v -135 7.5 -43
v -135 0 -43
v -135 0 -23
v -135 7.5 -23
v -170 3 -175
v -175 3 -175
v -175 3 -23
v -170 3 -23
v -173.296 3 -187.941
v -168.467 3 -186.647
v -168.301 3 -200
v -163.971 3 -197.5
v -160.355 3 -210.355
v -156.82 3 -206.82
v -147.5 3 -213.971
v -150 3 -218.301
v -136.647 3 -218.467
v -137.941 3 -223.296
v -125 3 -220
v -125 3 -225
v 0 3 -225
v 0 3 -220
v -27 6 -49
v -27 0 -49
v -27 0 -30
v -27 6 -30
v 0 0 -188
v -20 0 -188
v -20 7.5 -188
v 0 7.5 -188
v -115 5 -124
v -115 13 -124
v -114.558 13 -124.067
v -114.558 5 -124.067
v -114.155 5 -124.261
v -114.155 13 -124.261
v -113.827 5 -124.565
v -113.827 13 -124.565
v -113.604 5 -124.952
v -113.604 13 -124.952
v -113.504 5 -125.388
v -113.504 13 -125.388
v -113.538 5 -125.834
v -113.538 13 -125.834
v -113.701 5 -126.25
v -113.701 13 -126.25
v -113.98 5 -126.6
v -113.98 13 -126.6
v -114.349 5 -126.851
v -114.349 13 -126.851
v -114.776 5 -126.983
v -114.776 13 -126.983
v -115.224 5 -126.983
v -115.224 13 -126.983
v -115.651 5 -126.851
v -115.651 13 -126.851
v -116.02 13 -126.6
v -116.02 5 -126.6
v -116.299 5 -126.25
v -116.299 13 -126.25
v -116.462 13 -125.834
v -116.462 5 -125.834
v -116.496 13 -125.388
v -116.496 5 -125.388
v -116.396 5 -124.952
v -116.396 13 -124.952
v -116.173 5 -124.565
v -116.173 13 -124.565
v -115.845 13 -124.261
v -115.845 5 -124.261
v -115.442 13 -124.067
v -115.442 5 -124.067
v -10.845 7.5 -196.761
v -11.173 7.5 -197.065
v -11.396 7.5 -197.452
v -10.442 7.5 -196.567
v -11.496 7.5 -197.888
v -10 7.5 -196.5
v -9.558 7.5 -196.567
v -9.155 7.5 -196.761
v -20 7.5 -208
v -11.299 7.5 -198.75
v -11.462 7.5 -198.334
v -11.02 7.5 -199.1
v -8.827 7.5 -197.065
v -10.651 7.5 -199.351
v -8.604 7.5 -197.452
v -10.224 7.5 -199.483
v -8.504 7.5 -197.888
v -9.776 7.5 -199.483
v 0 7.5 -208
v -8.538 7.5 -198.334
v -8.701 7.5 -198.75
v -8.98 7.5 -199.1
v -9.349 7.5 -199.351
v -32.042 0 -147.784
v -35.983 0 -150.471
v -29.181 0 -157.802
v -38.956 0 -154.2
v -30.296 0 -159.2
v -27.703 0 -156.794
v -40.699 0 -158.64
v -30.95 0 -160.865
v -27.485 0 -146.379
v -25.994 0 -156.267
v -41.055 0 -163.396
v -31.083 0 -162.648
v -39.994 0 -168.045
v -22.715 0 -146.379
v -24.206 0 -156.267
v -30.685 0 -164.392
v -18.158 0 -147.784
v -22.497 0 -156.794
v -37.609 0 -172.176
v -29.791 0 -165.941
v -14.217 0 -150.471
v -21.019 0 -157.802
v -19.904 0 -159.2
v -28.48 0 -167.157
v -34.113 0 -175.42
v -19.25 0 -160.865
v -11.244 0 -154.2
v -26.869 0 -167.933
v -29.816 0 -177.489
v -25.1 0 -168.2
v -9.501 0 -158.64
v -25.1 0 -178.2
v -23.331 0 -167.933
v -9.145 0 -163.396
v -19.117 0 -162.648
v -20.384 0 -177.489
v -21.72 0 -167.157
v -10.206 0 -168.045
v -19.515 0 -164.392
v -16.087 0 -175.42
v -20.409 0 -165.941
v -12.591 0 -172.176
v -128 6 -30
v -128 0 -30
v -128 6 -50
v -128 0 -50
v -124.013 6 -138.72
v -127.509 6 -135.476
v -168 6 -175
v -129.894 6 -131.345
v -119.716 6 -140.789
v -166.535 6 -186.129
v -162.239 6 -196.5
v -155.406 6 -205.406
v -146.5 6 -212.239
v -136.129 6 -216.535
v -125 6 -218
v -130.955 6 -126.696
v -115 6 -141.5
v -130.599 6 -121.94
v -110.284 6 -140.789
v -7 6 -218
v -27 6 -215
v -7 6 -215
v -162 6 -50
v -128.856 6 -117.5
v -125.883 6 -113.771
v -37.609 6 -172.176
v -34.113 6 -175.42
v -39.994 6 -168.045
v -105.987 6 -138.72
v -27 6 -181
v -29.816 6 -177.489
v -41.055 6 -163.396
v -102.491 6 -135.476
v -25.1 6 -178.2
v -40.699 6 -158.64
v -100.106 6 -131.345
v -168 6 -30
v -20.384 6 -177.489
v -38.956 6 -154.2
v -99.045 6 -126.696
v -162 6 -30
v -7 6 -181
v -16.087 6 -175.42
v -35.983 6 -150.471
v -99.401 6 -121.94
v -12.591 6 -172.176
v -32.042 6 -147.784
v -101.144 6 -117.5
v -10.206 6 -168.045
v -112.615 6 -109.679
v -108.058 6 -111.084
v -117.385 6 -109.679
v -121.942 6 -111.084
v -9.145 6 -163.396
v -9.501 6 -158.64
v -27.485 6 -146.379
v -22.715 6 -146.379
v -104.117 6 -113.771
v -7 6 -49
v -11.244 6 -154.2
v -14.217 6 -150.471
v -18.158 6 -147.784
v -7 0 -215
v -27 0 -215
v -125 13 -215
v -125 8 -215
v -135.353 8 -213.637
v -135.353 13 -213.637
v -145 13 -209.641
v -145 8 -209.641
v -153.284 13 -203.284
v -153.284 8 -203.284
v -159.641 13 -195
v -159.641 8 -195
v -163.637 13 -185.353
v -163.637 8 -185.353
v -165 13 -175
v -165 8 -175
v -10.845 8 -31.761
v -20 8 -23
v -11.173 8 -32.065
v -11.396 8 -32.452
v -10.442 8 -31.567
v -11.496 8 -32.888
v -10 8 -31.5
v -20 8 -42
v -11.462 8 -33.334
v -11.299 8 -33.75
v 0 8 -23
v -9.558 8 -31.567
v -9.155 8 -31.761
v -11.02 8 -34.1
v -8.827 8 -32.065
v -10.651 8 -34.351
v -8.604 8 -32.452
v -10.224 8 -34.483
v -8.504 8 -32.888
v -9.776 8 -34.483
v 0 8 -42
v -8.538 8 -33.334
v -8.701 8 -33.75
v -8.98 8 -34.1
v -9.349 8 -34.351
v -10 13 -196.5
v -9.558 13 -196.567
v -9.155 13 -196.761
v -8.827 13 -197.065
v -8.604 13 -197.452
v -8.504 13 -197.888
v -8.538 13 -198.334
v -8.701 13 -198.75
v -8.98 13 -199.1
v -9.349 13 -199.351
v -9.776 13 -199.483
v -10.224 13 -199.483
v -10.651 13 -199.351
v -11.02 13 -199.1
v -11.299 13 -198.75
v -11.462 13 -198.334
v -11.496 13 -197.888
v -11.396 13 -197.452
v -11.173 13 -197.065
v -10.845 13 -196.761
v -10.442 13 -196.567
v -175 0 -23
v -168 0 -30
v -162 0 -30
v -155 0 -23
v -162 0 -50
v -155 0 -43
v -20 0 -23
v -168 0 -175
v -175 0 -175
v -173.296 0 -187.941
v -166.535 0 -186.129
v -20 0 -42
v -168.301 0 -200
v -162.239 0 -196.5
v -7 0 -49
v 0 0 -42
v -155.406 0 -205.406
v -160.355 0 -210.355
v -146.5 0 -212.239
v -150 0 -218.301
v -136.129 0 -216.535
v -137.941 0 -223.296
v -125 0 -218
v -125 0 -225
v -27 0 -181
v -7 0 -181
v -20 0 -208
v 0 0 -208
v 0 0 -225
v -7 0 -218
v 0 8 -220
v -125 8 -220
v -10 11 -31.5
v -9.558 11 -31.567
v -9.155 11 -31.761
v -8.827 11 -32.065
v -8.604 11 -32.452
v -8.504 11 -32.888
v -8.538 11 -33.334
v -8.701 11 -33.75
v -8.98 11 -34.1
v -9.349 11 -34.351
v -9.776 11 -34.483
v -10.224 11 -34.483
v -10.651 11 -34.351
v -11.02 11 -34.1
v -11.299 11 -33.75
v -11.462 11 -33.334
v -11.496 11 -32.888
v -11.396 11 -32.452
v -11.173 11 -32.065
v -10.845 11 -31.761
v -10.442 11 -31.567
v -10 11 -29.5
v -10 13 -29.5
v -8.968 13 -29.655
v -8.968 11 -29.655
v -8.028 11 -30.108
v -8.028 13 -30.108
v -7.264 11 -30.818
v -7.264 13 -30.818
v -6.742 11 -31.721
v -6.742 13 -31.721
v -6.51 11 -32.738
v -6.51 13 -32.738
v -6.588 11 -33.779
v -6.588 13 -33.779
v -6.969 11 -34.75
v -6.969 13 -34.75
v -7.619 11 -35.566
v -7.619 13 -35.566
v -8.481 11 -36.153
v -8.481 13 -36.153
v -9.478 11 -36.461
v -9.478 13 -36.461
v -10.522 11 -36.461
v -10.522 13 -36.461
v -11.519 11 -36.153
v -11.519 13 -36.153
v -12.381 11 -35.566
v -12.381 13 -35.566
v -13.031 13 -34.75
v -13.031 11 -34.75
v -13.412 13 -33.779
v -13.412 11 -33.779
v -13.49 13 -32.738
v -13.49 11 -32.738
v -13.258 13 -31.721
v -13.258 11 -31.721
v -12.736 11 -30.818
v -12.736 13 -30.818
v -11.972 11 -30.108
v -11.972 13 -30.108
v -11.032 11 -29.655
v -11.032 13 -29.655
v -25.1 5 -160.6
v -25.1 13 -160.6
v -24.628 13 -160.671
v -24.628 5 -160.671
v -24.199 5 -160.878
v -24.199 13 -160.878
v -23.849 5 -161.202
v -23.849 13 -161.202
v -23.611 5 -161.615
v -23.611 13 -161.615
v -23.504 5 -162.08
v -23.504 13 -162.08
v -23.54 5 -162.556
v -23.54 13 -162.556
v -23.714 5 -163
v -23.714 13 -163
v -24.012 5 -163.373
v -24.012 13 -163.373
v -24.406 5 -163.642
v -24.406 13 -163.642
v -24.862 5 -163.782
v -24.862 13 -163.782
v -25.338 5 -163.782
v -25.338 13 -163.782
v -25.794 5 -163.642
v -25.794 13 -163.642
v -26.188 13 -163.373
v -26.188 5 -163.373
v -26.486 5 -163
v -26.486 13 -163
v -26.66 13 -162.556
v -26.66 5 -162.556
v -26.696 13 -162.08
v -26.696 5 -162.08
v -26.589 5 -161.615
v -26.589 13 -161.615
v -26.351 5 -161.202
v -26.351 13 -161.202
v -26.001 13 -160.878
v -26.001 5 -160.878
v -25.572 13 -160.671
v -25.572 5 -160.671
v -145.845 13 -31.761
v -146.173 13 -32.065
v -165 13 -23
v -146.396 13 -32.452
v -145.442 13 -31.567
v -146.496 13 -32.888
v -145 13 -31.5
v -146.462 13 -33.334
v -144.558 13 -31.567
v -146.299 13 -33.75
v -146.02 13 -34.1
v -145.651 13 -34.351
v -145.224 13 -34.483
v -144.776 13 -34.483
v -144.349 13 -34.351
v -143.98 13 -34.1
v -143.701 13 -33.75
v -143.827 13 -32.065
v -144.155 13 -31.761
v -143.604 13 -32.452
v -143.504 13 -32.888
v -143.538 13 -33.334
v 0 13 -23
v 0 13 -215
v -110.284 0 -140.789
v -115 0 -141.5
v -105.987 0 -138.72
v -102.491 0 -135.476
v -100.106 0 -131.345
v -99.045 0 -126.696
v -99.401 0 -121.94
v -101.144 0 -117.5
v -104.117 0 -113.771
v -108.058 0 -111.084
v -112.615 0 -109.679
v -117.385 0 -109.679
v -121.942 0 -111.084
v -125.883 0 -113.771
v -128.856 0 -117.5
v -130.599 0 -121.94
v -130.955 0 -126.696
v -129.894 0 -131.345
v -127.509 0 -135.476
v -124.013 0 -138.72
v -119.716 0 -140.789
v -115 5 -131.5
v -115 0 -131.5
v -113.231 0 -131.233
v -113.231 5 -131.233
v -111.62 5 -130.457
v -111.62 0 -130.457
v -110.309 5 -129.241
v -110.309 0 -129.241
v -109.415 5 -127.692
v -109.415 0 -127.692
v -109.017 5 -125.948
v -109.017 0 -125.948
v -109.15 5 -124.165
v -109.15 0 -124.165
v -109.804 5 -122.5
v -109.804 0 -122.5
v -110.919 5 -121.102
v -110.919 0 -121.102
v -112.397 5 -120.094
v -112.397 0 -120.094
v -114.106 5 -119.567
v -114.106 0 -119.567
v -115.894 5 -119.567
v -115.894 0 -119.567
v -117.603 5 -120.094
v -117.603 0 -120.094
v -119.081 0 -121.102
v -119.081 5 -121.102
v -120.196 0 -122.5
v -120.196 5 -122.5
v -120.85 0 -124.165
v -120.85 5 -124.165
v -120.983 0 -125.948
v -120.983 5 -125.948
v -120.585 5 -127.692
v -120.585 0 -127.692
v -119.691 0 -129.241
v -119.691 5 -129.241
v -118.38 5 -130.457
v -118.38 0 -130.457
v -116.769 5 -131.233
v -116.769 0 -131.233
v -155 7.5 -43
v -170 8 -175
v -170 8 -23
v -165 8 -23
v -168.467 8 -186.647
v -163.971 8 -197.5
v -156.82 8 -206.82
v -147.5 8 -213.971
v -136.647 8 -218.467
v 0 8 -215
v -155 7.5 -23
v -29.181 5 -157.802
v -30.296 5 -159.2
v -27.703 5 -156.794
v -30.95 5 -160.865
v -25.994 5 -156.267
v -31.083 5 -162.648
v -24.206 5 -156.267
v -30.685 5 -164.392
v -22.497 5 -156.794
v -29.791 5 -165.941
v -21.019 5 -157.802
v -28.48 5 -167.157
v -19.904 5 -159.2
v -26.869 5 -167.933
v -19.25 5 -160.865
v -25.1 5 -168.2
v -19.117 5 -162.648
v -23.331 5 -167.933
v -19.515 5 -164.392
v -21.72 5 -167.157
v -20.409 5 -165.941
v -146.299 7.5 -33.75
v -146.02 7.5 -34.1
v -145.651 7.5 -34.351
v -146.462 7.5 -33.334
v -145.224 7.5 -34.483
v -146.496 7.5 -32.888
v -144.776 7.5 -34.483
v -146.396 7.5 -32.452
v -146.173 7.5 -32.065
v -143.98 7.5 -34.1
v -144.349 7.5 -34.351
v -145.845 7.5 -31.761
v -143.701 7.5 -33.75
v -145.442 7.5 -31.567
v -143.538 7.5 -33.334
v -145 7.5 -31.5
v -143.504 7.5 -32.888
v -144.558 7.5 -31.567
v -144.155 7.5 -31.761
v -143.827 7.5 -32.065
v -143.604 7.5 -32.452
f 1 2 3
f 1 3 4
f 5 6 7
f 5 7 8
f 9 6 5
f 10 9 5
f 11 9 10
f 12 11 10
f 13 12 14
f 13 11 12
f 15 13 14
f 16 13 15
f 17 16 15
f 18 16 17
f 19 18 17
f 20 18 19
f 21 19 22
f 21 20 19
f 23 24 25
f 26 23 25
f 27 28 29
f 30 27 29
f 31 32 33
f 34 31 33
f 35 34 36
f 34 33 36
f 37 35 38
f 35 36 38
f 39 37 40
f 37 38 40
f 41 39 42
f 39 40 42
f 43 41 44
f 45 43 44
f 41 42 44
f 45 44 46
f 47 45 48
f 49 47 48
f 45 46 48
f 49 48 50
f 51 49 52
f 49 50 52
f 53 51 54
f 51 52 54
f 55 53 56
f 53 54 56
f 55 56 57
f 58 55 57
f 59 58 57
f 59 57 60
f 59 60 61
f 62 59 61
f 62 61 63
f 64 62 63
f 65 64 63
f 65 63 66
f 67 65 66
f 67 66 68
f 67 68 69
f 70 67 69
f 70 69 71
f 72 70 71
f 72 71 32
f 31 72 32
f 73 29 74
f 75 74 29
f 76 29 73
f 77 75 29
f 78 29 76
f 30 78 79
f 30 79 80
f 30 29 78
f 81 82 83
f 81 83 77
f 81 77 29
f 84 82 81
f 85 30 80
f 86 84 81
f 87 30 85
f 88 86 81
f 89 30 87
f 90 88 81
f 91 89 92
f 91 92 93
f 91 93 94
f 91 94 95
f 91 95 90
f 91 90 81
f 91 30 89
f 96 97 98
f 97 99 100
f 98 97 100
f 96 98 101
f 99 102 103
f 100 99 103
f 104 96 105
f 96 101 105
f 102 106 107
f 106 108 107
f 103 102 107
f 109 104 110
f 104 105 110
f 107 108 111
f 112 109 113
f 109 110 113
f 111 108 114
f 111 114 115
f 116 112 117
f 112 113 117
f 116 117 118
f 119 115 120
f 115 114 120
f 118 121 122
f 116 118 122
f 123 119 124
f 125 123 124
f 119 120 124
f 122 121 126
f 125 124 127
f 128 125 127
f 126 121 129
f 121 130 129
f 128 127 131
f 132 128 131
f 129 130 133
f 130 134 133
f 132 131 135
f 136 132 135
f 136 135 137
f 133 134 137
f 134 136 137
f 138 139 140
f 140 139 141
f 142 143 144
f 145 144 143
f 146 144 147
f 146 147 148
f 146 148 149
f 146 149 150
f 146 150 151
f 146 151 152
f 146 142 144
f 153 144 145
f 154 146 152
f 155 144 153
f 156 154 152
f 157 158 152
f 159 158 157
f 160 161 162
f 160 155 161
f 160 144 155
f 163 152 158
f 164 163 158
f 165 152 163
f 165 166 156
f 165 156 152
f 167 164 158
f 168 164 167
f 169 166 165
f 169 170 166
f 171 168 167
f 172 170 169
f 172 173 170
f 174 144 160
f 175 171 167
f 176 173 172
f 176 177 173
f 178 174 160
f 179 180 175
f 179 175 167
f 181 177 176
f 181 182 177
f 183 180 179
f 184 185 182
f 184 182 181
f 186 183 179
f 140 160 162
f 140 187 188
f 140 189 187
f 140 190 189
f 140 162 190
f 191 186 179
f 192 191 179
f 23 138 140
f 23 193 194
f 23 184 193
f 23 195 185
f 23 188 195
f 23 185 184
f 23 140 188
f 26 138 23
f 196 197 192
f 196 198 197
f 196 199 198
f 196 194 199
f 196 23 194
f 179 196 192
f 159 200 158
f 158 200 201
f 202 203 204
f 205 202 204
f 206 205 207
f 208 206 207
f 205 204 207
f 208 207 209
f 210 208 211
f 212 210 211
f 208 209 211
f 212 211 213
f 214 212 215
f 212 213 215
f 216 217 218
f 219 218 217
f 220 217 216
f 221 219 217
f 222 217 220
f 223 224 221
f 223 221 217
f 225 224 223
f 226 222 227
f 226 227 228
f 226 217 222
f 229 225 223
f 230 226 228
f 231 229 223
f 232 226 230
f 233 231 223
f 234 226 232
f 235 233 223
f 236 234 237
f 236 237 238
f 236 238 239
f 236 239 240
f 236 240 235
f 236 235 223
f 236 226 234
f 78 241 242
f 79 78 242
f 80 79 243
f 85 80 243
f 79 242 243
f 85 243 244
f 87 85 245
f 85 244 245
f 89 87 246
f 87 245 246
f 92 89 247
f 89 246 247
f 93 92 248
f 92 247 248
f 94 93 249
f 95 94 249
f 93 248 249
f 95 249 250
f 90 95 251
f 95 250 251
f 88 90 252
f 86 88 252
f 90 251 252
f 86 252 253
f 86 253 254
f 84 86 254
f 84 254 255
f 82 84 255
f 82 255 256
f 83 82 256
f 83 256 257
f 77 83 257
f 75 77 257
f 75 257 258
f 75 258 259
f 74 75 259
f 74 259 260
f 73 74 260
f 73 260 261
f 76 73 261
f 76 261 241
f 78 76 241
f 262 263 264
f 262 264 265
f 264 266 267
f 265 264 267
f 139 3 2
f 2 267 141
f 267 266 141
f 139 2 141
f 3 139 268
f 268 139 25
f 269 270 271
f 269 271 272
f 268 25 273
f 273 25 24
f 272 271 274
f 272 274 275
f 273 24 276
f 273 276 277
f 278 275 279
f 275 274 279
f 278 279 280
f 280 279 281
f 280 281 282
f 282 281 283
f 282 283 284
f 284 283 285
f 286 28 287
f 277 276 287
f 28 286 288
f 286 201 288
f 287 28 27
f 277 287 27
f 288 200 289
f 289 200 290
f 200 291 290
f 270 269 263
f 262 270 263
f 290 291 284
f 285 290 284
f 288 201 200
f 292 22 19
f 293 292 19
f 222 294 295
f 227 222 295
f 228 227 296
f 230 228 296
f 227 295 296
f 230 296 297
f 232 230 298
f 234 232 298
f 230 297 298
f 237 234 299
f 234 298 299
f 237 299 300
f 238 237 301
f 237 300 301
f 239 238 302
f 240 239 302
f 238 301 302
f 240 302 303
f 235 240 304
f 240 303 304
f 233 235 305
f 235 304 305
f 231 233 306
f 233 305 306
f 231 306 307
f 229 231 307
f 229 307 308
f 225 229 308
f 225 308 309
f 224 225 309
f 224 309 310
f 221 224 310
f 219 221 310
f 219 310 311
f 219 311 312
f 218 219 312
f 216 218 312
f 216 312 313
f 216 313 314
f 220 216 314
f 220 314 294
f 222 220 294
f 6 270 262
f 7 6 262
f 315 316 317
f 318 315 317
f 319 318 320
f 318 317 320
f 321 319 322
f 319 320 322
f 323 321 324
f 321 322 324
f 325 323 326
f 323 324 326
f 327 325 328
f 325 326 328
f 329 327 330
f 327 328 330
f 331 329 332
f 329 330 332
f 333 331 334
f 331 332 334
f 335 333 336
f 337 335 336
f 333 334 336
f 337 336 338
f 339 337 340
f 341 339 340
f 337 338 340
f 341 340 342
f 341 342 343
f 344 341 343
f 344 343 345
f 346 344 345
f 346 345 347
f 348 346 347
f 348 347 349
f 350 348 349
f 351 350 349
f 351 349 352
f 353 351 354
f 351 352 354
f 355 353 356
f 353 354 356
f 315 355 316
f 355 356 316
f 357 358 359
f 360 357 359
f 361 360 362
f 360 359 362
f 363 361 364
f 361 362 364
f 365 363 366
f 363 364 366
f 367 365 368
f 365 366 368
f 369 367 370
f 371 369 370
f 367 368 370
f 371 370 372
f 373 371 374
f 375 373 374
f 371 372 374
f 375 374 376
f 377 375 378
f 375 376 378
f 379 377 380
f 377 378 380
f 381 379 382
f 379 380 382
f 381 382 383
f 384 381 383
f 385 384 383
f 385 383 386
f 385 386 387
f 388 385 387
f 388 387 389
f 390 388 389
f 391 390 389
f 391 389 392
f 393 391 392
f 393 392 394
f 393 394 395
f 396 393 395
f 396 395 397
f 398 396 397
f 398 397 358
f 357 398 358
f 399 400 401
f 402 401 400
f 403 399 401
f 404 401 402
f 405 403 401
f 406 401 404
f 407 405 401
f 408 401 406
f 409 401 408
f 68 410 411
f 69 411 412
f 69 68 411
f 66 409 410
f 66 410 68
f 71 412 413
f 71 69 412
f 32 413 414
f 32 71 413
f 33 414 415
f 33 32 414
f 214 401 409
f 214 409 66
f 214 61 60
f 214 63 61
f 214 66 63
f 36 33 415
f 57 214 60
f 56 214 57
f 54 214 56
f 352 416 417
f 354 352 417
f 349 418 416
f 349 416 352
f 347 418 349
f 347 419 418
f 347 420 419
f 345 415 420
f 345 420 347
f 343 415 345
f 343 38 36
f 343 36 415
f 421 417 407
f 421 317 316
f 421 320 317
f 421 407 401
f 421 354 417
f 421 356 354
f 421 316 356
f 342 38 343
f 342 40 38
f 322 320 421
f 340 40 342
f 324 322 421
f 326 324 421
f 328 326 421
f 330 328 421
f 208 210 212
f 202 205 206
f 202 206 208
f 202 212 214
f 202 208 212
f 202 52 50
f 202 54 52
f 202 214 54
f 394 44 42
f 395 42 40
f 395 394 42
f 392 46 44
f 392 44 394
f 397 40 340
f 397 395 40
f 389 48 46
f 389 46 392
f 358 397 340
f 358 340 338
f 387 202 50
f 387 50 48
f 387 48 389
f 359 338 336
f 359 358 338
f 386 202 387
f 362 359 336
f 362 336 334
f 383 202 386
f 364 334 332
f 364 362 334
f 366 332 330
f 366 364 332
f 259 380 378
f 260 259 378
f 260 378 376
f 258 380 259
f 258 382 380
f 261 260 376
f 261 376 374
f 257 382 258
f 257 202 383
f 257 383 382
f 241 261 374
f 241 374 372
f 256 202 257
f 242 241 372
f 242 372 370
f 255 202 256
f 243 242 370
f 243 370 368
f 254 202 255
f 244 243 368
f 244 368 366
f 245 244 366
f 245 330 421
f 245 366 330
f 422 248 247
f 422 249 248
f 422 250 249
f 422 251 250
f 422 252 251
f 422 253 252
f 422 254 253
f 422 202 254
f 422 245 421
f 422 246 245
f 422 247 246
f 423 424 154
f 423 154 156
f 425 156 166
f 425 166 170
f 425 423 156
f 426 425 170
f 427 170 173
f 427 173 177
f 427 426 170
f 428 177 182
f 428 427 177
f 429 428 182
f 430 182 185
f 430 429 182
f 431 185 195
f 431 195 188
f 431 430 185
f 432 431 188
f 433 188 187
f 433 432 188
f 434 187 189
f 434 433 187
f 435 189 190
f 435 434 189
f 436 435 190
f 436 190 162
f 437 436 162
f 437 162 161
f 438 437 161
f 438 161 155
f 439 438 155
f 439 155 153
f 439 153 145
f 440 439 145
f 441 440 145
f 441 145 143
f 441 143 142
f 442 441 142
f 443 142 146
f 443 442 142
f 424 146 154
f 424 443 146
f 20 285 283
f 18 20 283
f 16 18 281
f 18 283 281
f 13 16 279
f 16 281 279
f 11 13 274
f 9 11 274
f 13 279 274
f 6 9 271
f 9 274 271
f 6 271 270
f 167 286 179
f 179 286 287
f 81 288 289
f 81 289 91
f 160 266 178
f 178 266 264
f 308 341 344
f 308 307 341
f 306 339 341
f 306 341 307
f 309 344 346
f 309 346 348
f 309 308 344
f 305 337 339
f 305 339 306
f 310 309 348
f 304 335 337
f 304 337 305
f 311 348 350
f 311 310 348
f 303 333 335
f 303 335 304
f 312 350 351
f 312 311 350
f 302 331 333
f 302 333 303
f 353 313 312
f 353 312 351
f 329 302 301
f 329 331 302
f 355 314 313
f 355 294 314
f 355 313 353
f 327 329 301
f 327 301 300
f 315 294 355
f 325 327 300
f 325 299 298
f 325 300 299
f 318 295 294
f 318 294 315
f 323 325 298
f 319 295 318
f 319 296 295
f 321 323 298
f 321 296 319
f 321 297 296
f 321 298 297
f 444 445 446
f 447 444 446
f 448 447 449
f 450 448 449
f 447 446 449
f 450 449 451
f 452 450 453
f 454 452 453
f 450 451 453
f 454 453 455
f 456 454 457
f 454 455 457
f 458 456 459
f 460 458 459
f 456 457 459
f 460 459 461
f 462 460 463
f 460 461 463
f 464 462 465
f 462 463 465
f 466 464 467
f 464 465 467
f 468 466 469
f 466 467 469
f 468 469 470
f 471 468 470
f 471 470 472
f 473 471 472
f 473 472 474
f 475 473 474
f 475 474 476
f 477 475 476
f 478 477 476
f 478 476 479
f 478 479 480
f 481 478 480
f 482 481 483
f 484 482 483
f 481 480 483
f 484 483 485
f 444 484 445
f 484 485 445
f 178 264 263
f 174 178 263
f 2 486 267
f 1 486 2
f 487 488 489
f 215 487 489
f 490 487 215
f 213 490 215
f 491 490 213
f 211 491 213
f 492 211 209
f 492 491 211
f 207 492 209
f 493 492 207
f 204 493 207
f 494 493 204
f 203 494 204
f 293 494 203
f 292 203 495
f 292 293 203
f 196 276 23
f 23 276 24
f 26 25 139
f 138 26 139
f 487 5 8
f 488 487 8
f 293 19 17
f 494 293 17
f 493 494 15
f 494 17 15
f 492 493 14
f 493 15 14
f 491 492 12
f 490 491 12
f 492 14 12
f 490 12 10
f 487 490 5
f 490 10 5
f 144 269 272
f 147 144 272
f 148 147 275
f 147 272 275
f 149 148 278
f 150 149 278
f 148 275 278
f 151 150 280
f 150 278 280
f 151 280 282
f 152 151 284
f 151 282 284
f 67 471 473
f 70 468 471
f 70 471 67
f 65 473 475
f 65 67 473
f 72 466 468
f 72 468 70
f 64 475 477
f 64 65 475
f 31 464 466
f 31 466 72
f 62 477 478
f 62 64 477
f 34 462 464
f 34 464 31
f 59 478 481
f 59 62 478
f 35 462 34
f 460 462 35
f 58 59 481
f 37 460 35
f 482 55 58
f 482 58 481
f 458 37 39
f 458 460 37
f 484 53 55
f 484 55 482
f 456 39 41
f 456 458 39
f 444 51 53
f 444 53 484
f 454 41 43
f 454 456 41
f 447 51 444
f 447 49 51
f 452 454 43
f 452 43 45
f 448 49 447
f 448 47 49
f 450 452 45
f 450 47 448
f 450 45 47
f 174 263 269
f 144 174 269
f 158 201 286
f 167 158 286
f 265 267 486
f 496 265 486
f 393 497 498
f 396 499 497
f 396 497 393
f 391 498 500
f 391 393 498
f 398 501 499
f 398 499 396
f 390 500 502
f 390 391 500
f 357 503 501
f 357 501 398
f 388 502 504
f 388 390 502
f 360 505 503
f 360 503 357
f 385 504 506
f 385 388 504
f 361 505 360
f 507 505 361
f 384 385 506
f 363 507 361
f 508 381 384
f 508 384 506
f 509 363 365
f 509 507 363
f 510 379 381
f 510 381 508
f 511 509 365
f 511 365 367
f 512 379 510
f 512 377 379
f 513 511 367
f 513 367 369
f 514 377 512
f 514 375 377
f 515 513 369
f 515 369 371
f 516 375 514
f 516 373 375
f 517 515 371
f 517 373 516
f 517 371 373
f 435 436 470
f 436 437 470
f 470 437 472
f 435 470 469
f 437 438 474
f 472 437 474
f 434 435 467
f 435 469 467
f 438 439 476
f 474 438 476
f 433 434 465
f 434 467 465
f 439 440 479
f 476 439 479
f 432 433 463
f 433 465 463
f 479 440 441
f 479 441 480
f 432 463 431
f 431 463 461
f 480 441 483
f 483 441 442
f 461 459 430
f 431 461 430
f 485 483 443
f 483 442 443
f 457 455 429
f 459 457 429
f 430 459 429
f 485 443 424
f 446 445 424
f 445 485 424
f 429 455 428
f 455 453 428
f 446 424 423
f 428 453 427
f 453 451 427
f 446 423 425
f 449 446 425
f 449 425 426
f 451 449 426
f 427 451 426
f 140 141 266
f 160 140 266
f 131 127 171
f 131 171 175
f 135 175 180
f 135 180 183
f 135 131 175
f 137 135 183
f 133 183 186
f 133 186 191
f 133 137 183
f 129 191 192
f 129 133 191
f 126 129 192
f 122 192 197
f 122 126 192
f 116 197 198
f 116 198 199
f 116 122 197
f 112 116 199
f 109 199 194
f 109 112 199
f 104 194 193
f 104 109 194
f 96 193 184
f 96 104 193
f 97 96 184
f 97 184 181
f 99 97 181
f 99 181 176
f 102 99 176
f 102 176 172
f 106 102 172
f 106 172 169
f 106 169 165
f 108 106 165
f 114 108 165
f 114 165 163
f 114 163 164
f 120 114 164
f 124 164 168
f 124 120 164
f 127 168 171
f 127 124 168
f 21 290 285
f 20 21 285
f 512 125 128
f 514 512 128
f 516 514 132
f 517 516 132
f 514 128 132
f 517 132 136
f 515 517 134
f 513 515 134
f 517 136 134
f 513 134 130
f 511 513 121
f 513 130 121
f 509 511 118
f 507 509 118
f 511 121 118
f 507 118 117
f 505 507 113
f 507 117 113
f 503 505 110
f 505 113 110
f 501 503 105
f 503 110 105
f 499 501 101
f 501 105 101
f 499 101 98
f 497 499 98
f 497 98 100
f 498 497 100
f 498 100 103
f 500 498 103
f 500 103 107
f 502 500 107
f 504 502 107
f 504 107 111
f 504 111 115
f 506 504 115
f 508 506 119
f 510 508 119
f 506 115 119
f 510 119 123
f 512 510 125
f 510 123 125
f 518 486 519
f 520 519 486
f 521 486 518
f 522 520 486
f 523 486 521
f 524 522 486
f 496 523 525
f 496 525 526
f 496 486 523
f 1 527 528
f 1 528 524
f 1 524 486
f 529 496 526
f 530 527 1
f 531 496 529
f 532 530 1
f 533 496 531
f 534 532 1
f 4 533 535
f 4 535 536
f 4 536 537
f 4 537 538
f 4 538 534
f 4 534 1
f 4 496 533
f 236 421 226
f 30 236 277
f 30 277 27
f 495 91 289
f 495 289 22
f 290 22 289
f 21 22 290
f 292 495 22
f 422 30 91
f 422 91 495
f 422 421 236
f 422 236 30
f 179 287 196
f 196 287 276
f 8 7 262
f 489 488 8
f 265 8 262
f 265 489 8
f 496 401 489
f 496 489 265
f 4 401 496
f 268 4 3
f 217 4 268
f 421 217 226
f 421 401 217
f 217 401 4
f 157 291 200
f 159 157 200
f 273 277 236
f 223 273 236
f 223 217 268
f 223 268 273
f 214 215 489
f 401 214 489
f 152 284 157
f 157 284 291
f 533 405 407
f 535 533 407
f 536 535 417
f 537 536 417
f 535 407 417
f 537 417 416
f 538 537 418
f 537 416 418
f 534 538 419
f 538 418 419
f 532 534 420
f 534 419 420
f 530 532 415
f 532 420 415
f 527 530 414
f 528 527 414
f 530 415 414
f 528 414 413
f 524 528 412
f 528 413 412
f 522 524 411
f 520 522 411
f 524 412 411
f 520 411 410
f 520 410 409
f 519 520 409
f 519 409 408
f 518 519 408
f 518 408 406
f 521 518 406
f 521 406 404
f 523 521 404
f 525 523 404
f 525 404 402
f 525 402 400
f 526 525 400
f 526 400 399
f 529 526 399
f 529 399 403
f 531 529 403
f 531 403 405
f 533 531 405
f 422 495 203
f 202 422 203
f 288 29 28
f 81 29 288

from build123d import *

# Parameters (mm, degrees)
SALIENTE_EXTRUIR1_DEPTH = 3
SALIENTE_EXTRUIR2_DEPTH = 5
SALIENTE_EXTRUIR3_DEPTH = 5
CROQUIS6_R              = 2.25
CORTAR_EXTRUIR3_DEPTH   = 5
CROQUIS7_R              = 1.5
CORTAR_EXTRUIR4_DEPTH   = 286.340147894
CORTAR_EXTRUIR5_DEPTH   = 8
CROQUIS9_R              = 1.5
CORTAR_EXTRUIR6_DEPTH   = 286.340147894
CROQUIS10_W             = 25
CROQUIS10_H             = 50
CORTAR_EXTRUIR7_DEPTH   = 5
CHAFL_N1_SIZE           = 5
CROQUIS13_R             = 3.5
CROQUIS13_R_2           = 2.25
SALIENTE_EXTRUIR4_DEPTH = 25
CROQUIS14_R             = 3
CROQUIS14_R_2           = 1.25
CROQUIS14_R_3           = 1.5
SALIENTE_EXTRUIR5_DEPTH = 10
CROQUIS12_R             = 1.6
CORTAR_EXTRUIR9_DEPTH   = 287.138078556
CROQUIS11_R             = 6
CORTAR_EXTRUIR8_DEPTH   = 5
CROQUIS16_W             = 40
CROQUIS16_H             = 8
CORTAR_EXTRUIR10_DEPTH  = 20
CORTAR_EXTRUIR11_DEPTH  = 30
CROQUIS19_R             = 1.5
CORTAR_EXTRUIR12_DEPTH  = 70
CROQUIS20_W             = 20
CROQUIS20_H             = 7.5
CORTAR_EXTRUIR13_DEPTH  = 20
CROQUIS21_W             = 20
CROQUIS21_H             = 7.5
CORTAR_EXTRUIR14_DEPTH  = 20
CROQUIS22_R             = 16
CORTAR_EXTRUIR15_DEPTH  = 6
CROQUIS23_R             = 3.5
CORTAR_EXTRUIR16_DEPTH  = 2


with BuildPart() as part:
    # Croquis1 → Saliente-Extruir1 (new body)
    with BuildSketch(Plane(origin=(0, 0, 0), x_dir=(1, 0, 0), z_dir=(0, 1, 0))):
        with BuildLine():
            Line((125, 225), (-125, 225))
            ThreePointArc((-125, 225), (-160.355339059, 210.355339059), (-175, 175))
            Line((-175, 175), (-175, -175))
            ThreePointArc((-175, -175), (-160.355339059, -210.355339059), (-125, -225))
            Line((-125, -225), (125, -225))
            ThreePointArc((125, -225), (160.355339059, -210.355339059), (175, -175))
            Line((175, -175), (175, 175))
            ThreePointArc((175, 175), (160.355339059, 210.355339059), (125, 225))
        make_face()
    extrude(amount=SALIENTE_EXTRUIR1_DEPTH)

    # Croquis2 → Saliente-Extruir2 (add)
    with BuildSketch(Plane(origin=(0, 3, 0), x_dir=(1, 0, 0), z_dir=(0, 1, 0))):
        with BuildLine():
            Line((-125, -220), (125, -220))
            ThreePointArc((125, -220), (156.819805153, -206.819805153), (170, -175))
            Line((170, -175), (170, 175))
            ThreePointArc((170, 175), (156.819805153, 206.819805153), (125, 220))
            Line((125, 220), (-125, 220))
            ThreePointArc((-125, 220), (-156.819805153, 206.819805153), (-170, 175))
            Line((-170, 175), (-170, -175))
            ThreePointArc((-170, -175), (-156.819805153, -206.819805153), (-125, -220))
        make_face()
    extrude(amount=SALIENTE_EXTRUIR2_DEPTH)

    # Croquis3 → Saliente-Extruir3 (add)
    with BuildSketch(Plane(origin=(0, 8, 0), x_dir=(1, 0, 0), z_dir=(0, 1, 0))):
        with BuildLine():
            Line((-125, -215), (125, -215))
            ThreePointArc((125, -215), (153.284271247, -203.284271247), (165, -175))
            Line((165, -175), (165, 175))
            ThreePointArc((165, 175), (153.284271247, 203.284271247), (125, 215))
            Line((125, 215), (-125, 215))
            ThreePointArc((-125, 215), (-153.284271247, 203.284271247), (-165, 175))
            Line((-165, 175), (-165, -175))
            ThreePointArc((-165, -175), (-153.284271247, -203.284271247), (-125, -215))
        make_face()
    extrude(amount=SALIENTE_EXTRUIR3_DEPTH)

    # Croquis6 → Cortar-Extruir3 (cut)
    with BuildSketch(Plane(origin=(0, 13, 0), x_dir=(1, 0, 0), z_dir=(0, 1, 0))):
        with Locations(Location((-87, -130, 0), (0, 0, 270))):
            Circle(CROQUIS6_R)
        with Locations(Location((-87, -70, 0), (0, 0, 270))):
            Circle(CROQUIS6_R)
        with Locations(Location((-87, -10, 0), (0, 0, 270))):
            Circle(CROQUIS6_R)
        with Locations(Location((87, -130, 0), (0, 0, 90))):
            Circle(CROQUIS6_R)
        with Locations(Location((87, -70, 0), (0, 0, 90))):
            Circle(CROQUIS6_R)
        with Locations(Location((87, -10, 0), (0, 0, 90))):
            Circle(CROQUIS6_R)
    extrude(amount=-CORTAR_EXTRUIR3_DEPTH, mode=Mode.SUBTRACT)

    # Croquis7 → Cortar-Extruir4 (cut, through all)
    with BuildSketch(Plane(origin=(0, 13, 0), x_dir=(1, 0, 0), z_dir=(0, 1, 0))):
        with Locations(Location((-115, -70, 0), (0, 0, 270))):
            Circle(CROQUIS7_R)
        with Locations(Location((-115, 125.5, 0), (0, 0, 270))):
            Circle(CROQUIS7_R)
        with Locations(Location((115, -70, 0), (0, 0, 90))):
            Circle(CROQUIS7_R)
        with Locations(Location((115, 125.5, 0), (0, 0, 90))):
            Circle(CROQUIS7_R)
    extrude(amount=-CORTAR_EXTRUIR4_DEPTH, mode=Mode.SUBTRACT)

    # Croquis8 → Cortar-Extruir5 (cut)
    with BuildSketch(Plane(origin=(0, 13, 0), x_dir=(1, 0, 0), z_dir=(0, 1, 0))):
        with BuildLine():
            Line((16.014653583, -158), (16.014653583, -178))
            ThreePointArc((16.014653583, -178), (13.014653583, -181), (10.014653583, -178))
            Line((10.014653583, -178), (10.014653583, -158))
            ThreePointArc((10.014653583, -158), (13.014653583, -155), (16.014653583, -158))
        make_face()
        with BuildLine():
            Line((28.014653583, -158), (28.014653583, -178))
            ThreePointArc((28.014653583, -178), (25.014653583, -181), (22.014653583, -178))
            Line((22.014653583, -178), (22.014653583, -158))
            ThreePointArc((22.014653583, -158), (25.014653583, -155), (28.014653583, -158))
        make_face()
        with BuildLine():
            Line((28.014653583, -106), (28.014653583, -126))
            ThreePointArc((28.014653583, -126), (25.014653583, -129), (22.014653583, -126))
            Line((22.014653583, -126), (22.014653583, -106))
            ThreePointArc((22.014653583, -106), (25.014653583, -103), (28.014653583, -106))
        make_face()
        with BuildLine():
            Line((16.014653583, -106), (16.014653583, -126))
            ThreePointArc((16.014653583, -126), (13.014653583, -129), (10.014653583, -126))
            Line((10.014653583, -126), (10.014653583, -106))
            ThreePointArc((10.014653583, -106), (13.014653583, -103), (16.014653583, -106))
        make_face()
    extrude(amount=-CORTAR_EXTRUIR5_DEPTH, mode=Mode.SUBTRACT)

    # Croquis9 → Cortar-Extruir6 (cut, through all)
    with BuildSketch(Plane(origin=(0, 13, 0), x_dir=(1, 0, 0), z_dir=(0, 1, 0))):
        with Locations(Location((13.014653583, -168, 0), (0, 0, 270))):
            Circle(CROQUIS9_R)
        with Locations(Location((25.014653583, -168, 0), (0, 0, 270))):
            Circle(CROQUIS9_R)
        with Locations(Location((13.014653583, -116, 0), (0, 0, 270))):
            Circle(CROQUIS9_R)
        with Locations(Location((25.014653583, -116, 0), (0, 0, 270))):
            Circle(CROQUIS9_R)
        with Locations(Location((-87, -130, 0), (0, 0, 270))):
            Circle(CROQUIS9_R)
        with Locations(Location((-87, -70, 0), (0, 0, 270))):
            Circle(CROQUIS9_R)
        with Locations(Location((-87, -10, 0), (0, 0, 270))):
            Circle(CROQUIS9_R)
        with Locations(Location((87, -10, 0), (0, 0, 270))):
            Circle(CROQUIS9_R)
        with Locations(Location((87, -70, 0), (0, 0, 270))):
            Circle(CROQUIS9_R)
        with Locations(Location((87, -130, 0), (0, 0, 270))):
            Circle(CROQUIS9_R)
    extrude(amount=-CORTAR_EXTRUIR6_DEPTH, mode=Mode.SUBTRACT)

    # Croquis10 → Cortar-Extruir7 (cut)
    with BuildSketch(Plane(origin=(0, 13, 0), x_dir=(1, 0, 0), z_dir=(0, 1, 0))):
        with Locations((62.5, -145)):
            Rectangle(CROQUIS10_W, CROQUIS10_H)
    extrude(amount=-CORTAR_EXTRUIR7_DEPTH, mode=Mode.SUBTRACT)

    # Chaflán1
    chafl_n1_edges = [part.edges().sort_by_distance(p)[0] for p in [
        (62.5, 13, 120),
        (50, 13, 145),
        (62.5, 13, 170),
        (75, 13, 145),
    ]]
    chamfer(chafl_n1_edges, length=CHAFL_N1_SIZE - 0.0001)  # a hair under: the kernel refuses the full size

    # Croquis13 → Saliente-Extruir4 (add)
    # profile 1 of 4: a face of its own
    with BuildSketch(Plane(origin=(0, 13, 0), x_dir=(1, 0, 0), z_dir=(0, 1, 0))):
        with Locations(Location((-20, -50, 0), (0, 0, 270))):
            Circle(CROQUIS13_R)
        with Locations(Location((-20, -50, 0), (0, 0, 270))):
            Circle(CROQUIS13_R_2, mode=Mode.SUBTRACT)
    # profile 2 of 4: a face of its own
    with BuildSketch(Plane(origin=(0, 13, 0), x_dir=(1, 0, 0), z_dir=(0, 1, 0))):
        with Locations(Location((-60, -50, 0), (0, 0, 270))):
            Circle(CROQUIS13_R)
        with Locations(Location((-60, -50, 0), (0, 0, 270))):
            Circle(CROQUIS13_R_2, mode=Mode.SUBTRACT)
    # profile 3 of 4: a face of its own
    with BuildSketch(Plane(origin=(0, 13, 0), x_dir=(1, 0, 0), z_dir=(0, 1, 0))):
        with Locations(Location((-60, -90, 0), (0, 0, 270))):
            Circle(CROQUIS13_R)
        with Locations(Location((-60, -90, 0), (0, 0, 270))):
            Circle(CROQUIS13_R_2, mode=Mode.SUBTRACT)
    # profile 4 of 4: a face of its own
    with BuildSketch(Plane(origin=(0, 13, 0), x_dir=(1, 0, 0), z_dir=(0, 1, 0))):
        with Locations(Location((-20, -90, 0), (0, 0, 270))):
            Circle(CROQUIS13_R)
        with Locations(Location((-20, -90, 0), (0, 0, 270))):
            Circle(CROQUIS13_R_2, mode=Mode.SUBTRACT)
    extrude(amount=SALIENTE_EXTRUIR4_DEPTH)

    # Croquis14 → Saliente-Extruir5 (add)
    # profile 1 of 6: a face of its own
    with BuildSketch(Plane(origin=(0, 13, 0), x_dir=(1, 0, 0), z_dir=(0, 1, 0))):
        with Locations(Location((67.55, -40, 0), (0, 0, 270))):
            Circle(CROQUIS14_R)
        with Locations(Location((67.55, -40, 0), (0, 0, 270))):
            Circle(CROQUIS14_R_2, mode=Mode.SUBTRACT)
    # profile 2 of 6: a face of its own
    with BuildSketch(Plane(origin=(0, 13, 0), x_dir=(1, 0, 0), z_dir=(0, 1, 0))):
        with Locations(Location((3.15, -40, 0), (0, 0, 270))):
            Circle(CROQUIS14_R)
        with Locations(Location((3.15, -40, 0), (0, 0, 270))):
            Circle(CROQUIS14_R_2, mode=Mode.SUBTRACT)
    # profile 3 of 6: a face of its own
    with BuildSketch(Plane(origin=(0, 13, 0), x_dir=(1, 0, 0), z_dir=(0, 1, 0))):
        with Locations(Location((3, -91.9, 0), (0, 0, 270))):
            Circle(CROQUIS14_R)
        with Locations(Location((3, -91.9, 0), (0, 0, 270))):
            Circle(CROQUIS14_R_2, mode=Mode.SUBTRACT)
    # profile 4 of 6: a face of its own
    with BuildSketch(Plane(origin=(0, 13, 0), x_dir=(1, 0, 0), z_dir=(0, 1, 0))):
        with Locations(Location((67.4, -91.9, 0), (0, 0, 270))):
            Circle(CROQUIS14_R)
        with Locations(Location((67.4, -91.9, 0), (0, 0, 270))):
            Circle(CROQUIS14_R_2, mode=Mode.SUBTRACT)
    # profile 5 of 6: a face of its own
    with BuildSketch(Plane(origin=(0, 13, 0), x_dir=(1, 0, 0), z_dir=(0, 1, 0))):
        with Locations(Location((-10, -102.9, 0), (0, 0, 270))):
            Circle(CROQUIS14_R)
        with Locations(Location((-10, -102.9, 0), (0, 0, 270))):
            Circle(CROQUIS14_R_3, mode=Mode.SUBTRACT)
    # profile 6 of 6: a face of its own
    with BuildSketch(Plane(origin=(0, 13, 0), x_dir=(1, 0, 0), z_dir=(0, 1, 0))):
        with Locations(Location((-10, -118.108484849, 0), (0, 0, 270))):
            Circle(CROQUIS14_R)
        with Locations(Location((-10, -118.108484849, 0), (0, 0, 270))):
            Circle(CROQUIS14_R_3, mode=Mode.SUBTRACT)
    extrude(amount=SALIENTE_EXTRUIR5_DEPTH)

    # Croquis12 → Cortar-Extruir9 (cut, through all)
    with BuildSketch(Plane(origin=(0, 13, 0), x_dir=(1, 0, 0), z_dir=(0, 1, 0))):
        with Locations(Location((-25.1, 162.2, 0), (0, 0, 270))):
            Circle(CROQUIS12_R)
        with Locations(Location((25.1, 162.2, 0), (0, 0, 270))):
            Circle(CROQUIS12_R)
        with Locations(Location((-25.1, 12, 0), (0, 0, 270))):
            Circle(CROQUIS12_R)
        with Locations(Location((25.1, 12, 0), (0, 0, 270))):
            Circle(CROQUIS12_R)
    extrude(amount=-CORTAR_EXTRUIR9_DEPTH, mode=Mode.SUBTRACT)

    # Croquis11 → Cortar-Extruir8 (cut)
    with BuildSketch(Plane.XZ):
        with Locations(Location((87, 130, 0), (0, 0, 270))):
            Circle(CROQUIS11_R)
        with Locations(Location((87, 70, 0), (0, 0, 270))):
            Circle(CROQUIS11_R)
        with Locations(Location((87, 10, 0), (0, 0, 270))):
            Circle(CROQUIS11_R)
        with Locations(Location((-87, 10, 0), (0, 0, 270))):
            Circle(CROQUIS11_R)
        with Locations(Location((-87, 70, 0), (0, 0, 270))):
            Circle(CROQUIS11_R)
        with Locations(Location((-87, 130, 0), (0, 0, 270))):
            Circle(CROQUIS11_R)
        with Locations(Location((-115, 70, 0), (0, 0, 270))):
            Circle(CROQUIS11_R)
        with Locations(Location((115, 70, 0), (0, 0, 270))):
            Circle(CROQUIS11_R)
        with Locations(Location((115, -125.5, 0), (0, 0, 270))):
            Circle(CROQUIS11_R)
        with Locations(Location((-115, -125.5, 0), (0, 0, 270))):
            Circle(CROQUIS11_R)
        with Locations(Location((-25.1, -162.2, 0), (0, 0, 270))):
            Circle(CROQUIS11_R)
        with Locations(Location((25.1, -162.2, 0), (0, 0, 270))):
            Circle(CROQUIS11_R)
        with Locations(Location((-25.1, -12, 0), (0, 0, 270))):
            Circle(CROQUIS11_R)
        with Locations(Location((25.1, -12, 0), (0, 0, 270))):
            Circle(CROQUIS11_R)
        with BuildLine():
            Line((13.014653583, 188), (25.014653583, 188))
            ThreePointArc((25.014653583, 188), (45.014653583, 168), (25.014653583, 148))
            Line((25.014653583, 148), (13.014653583, 148))
            ThreePointArc((13.014653583, 148), (-6.985346417, 168), (13.014653583, 188))
        make_face()
        with BuildLine():
            Line((13.014653583, 136), (25.014653583, 136))
            ThreePointArc((25.014653583, 136), (45.014653583, 116), (25.014653583, 96))
            Line((25.014653583, 96), (13.014653583, 96))
            ThreePointArc((13.014653583, 96), (-6.985346417, 116), (13.014653583, 136))
        make_face()
    extrude(amount=-CORTAR_EXTRUIR8_DEPTH, mode=Mode.SUBTRACT)

    # Croquis16 → Cortar-Extruir10 (cut, symmetric)
    with BuildSketch(Plane(origin=(0, 0, 0), x_dir=(0, 0, -1), z_dir=(1, 0, 0))):
        with Locations((22, 4)):
            Rectangle(CROQUIS16_W, CROQUIS16_H)
    extrude(amount=CORTAR_EXTRUIR10_DEPTH, both=True, mode=Mode.SUBTRACT)

    # Croquis17 → Cortar-Extruir11 (cut, symmetric)
    with BuildSketch(Plane(origin=(0, 13, 0), x_dir=(1, 0, 0), z_dir=(0, 1, 0))):
        Polygon((-175, 23), (0, 23), (0, 225), (175, 225), (175, 23), (175, -225), (0, -225), (-175, -225), align=None)
    extrude(amount=CORTAR_EXTRUIR11_DEPTH, both=True, mode=Mode.SUBTRACT)

    # Croquis19 → Cortar-Extruir12 (cut)
    with BuildSketch(Plane(origin=(0, 13, 0), x_dir=(1, 0, 0), z_dir=(0, 1, 0))):
        with Locations(Location((-10, 33, 0), (0, 0, 270))):
            Circle(CROQUIS19_R)
        with Locations(Location((-10, 198, 0), (0, 0, 270))):
            Circle(CROQUIS19_R)
        with Locations(Location((-145, 33, 0), (0, 0, 270))):
            Circle(CROQUIS19_R)
    extrude(amount=-CORTAR_EXTRUIR12_DEPTH, mode=Mode.SUBTRACT)

    # Croquis20 → Cortar-Extruir13 (cut)
    with BuildSketch(Plane(origin=(0, 0, 0), x_dir=(0, 0, -1), z_dir=(1, 0, 0))):
        with Locations((198, 3.75)):
            Rectangle(CROQUIS20_W, CROQUIS20_H)
    extrude(amount=-CORTAR_EXTRUIR13_DEPTH, mode=Mode.SUBTRACT)

    # Croquis21 → Cortar-Extruir14 (cut)
    with BuildSketch(Plane.XY.offset(-23)):
        with Locations((-145, 3.75)):
            Rectangle(CROQUIS21_W, CROQUIS21_H)
    extrude(amount=-CORTAR_EXTRUIR14_DEPTH, mode=Mode.SUBTRACT)

    # Croquis22 → Cortar-Extruir15 (cut)
    with BuildSketch(Plane.XZ):
        with BuildLine():
            Line((-27, -181), (-7, -181))
            Line((-7, -181), (-7, -49))
            Line((-7, -49), (-27, -49))
            Line((-27, -49), (-27, -30))
            Line((-27, -30), (-128, -30))
            Line((-128, -30), (-128, -50))
            Line((-128, -50), (-162, -50))
            Line((-162, -50), (-162, -30))
            Line((-162, -30), (-168, -30))
            Line((-168, -30), (-168, -175))
            ThreePointArc((-168, -175), (-155.405591591, -205.405591591), (-125, -218))
            Line((-125, -218), (-7, -218))
            Line((-7, -218), (-7, -215))
            Line((-7, -215), (-27, -215))
            Line((-27, -215), (-27, -181))
        make_face()
        with Locations(Location((-115, -125.5, 0), (0, 0, 270))):
            Circle(CROQUIS22_R, mode=Mode.SUBTRACT)
        with Locations(Location((-25.1, -162.2, 0), (0, 0, 270))):
            Circle(CROQUIS22_R, mode=Mode.SUBTRACT)
    extrude(amount=-CORTAR_EXTRUIR15_DEPTH, mode=Mode.SUBTRACT)

    # Croquis23 → Cortar-Extruir16 (cut)
    with BuildSketch(Plane(origin=(0, 13, 0), x_dir=(1, 0, 0), z_dir=(0, 1, 0))):
        with Locations(Location((-10, 33, 0), (0, 0, 270))):
            Circle(CROQUIS23_R)
    extrude(amount=-CORTAR_EXTRUIR16_DEPTH, mode=Mode.SUBTRACT)


solid = part.part
